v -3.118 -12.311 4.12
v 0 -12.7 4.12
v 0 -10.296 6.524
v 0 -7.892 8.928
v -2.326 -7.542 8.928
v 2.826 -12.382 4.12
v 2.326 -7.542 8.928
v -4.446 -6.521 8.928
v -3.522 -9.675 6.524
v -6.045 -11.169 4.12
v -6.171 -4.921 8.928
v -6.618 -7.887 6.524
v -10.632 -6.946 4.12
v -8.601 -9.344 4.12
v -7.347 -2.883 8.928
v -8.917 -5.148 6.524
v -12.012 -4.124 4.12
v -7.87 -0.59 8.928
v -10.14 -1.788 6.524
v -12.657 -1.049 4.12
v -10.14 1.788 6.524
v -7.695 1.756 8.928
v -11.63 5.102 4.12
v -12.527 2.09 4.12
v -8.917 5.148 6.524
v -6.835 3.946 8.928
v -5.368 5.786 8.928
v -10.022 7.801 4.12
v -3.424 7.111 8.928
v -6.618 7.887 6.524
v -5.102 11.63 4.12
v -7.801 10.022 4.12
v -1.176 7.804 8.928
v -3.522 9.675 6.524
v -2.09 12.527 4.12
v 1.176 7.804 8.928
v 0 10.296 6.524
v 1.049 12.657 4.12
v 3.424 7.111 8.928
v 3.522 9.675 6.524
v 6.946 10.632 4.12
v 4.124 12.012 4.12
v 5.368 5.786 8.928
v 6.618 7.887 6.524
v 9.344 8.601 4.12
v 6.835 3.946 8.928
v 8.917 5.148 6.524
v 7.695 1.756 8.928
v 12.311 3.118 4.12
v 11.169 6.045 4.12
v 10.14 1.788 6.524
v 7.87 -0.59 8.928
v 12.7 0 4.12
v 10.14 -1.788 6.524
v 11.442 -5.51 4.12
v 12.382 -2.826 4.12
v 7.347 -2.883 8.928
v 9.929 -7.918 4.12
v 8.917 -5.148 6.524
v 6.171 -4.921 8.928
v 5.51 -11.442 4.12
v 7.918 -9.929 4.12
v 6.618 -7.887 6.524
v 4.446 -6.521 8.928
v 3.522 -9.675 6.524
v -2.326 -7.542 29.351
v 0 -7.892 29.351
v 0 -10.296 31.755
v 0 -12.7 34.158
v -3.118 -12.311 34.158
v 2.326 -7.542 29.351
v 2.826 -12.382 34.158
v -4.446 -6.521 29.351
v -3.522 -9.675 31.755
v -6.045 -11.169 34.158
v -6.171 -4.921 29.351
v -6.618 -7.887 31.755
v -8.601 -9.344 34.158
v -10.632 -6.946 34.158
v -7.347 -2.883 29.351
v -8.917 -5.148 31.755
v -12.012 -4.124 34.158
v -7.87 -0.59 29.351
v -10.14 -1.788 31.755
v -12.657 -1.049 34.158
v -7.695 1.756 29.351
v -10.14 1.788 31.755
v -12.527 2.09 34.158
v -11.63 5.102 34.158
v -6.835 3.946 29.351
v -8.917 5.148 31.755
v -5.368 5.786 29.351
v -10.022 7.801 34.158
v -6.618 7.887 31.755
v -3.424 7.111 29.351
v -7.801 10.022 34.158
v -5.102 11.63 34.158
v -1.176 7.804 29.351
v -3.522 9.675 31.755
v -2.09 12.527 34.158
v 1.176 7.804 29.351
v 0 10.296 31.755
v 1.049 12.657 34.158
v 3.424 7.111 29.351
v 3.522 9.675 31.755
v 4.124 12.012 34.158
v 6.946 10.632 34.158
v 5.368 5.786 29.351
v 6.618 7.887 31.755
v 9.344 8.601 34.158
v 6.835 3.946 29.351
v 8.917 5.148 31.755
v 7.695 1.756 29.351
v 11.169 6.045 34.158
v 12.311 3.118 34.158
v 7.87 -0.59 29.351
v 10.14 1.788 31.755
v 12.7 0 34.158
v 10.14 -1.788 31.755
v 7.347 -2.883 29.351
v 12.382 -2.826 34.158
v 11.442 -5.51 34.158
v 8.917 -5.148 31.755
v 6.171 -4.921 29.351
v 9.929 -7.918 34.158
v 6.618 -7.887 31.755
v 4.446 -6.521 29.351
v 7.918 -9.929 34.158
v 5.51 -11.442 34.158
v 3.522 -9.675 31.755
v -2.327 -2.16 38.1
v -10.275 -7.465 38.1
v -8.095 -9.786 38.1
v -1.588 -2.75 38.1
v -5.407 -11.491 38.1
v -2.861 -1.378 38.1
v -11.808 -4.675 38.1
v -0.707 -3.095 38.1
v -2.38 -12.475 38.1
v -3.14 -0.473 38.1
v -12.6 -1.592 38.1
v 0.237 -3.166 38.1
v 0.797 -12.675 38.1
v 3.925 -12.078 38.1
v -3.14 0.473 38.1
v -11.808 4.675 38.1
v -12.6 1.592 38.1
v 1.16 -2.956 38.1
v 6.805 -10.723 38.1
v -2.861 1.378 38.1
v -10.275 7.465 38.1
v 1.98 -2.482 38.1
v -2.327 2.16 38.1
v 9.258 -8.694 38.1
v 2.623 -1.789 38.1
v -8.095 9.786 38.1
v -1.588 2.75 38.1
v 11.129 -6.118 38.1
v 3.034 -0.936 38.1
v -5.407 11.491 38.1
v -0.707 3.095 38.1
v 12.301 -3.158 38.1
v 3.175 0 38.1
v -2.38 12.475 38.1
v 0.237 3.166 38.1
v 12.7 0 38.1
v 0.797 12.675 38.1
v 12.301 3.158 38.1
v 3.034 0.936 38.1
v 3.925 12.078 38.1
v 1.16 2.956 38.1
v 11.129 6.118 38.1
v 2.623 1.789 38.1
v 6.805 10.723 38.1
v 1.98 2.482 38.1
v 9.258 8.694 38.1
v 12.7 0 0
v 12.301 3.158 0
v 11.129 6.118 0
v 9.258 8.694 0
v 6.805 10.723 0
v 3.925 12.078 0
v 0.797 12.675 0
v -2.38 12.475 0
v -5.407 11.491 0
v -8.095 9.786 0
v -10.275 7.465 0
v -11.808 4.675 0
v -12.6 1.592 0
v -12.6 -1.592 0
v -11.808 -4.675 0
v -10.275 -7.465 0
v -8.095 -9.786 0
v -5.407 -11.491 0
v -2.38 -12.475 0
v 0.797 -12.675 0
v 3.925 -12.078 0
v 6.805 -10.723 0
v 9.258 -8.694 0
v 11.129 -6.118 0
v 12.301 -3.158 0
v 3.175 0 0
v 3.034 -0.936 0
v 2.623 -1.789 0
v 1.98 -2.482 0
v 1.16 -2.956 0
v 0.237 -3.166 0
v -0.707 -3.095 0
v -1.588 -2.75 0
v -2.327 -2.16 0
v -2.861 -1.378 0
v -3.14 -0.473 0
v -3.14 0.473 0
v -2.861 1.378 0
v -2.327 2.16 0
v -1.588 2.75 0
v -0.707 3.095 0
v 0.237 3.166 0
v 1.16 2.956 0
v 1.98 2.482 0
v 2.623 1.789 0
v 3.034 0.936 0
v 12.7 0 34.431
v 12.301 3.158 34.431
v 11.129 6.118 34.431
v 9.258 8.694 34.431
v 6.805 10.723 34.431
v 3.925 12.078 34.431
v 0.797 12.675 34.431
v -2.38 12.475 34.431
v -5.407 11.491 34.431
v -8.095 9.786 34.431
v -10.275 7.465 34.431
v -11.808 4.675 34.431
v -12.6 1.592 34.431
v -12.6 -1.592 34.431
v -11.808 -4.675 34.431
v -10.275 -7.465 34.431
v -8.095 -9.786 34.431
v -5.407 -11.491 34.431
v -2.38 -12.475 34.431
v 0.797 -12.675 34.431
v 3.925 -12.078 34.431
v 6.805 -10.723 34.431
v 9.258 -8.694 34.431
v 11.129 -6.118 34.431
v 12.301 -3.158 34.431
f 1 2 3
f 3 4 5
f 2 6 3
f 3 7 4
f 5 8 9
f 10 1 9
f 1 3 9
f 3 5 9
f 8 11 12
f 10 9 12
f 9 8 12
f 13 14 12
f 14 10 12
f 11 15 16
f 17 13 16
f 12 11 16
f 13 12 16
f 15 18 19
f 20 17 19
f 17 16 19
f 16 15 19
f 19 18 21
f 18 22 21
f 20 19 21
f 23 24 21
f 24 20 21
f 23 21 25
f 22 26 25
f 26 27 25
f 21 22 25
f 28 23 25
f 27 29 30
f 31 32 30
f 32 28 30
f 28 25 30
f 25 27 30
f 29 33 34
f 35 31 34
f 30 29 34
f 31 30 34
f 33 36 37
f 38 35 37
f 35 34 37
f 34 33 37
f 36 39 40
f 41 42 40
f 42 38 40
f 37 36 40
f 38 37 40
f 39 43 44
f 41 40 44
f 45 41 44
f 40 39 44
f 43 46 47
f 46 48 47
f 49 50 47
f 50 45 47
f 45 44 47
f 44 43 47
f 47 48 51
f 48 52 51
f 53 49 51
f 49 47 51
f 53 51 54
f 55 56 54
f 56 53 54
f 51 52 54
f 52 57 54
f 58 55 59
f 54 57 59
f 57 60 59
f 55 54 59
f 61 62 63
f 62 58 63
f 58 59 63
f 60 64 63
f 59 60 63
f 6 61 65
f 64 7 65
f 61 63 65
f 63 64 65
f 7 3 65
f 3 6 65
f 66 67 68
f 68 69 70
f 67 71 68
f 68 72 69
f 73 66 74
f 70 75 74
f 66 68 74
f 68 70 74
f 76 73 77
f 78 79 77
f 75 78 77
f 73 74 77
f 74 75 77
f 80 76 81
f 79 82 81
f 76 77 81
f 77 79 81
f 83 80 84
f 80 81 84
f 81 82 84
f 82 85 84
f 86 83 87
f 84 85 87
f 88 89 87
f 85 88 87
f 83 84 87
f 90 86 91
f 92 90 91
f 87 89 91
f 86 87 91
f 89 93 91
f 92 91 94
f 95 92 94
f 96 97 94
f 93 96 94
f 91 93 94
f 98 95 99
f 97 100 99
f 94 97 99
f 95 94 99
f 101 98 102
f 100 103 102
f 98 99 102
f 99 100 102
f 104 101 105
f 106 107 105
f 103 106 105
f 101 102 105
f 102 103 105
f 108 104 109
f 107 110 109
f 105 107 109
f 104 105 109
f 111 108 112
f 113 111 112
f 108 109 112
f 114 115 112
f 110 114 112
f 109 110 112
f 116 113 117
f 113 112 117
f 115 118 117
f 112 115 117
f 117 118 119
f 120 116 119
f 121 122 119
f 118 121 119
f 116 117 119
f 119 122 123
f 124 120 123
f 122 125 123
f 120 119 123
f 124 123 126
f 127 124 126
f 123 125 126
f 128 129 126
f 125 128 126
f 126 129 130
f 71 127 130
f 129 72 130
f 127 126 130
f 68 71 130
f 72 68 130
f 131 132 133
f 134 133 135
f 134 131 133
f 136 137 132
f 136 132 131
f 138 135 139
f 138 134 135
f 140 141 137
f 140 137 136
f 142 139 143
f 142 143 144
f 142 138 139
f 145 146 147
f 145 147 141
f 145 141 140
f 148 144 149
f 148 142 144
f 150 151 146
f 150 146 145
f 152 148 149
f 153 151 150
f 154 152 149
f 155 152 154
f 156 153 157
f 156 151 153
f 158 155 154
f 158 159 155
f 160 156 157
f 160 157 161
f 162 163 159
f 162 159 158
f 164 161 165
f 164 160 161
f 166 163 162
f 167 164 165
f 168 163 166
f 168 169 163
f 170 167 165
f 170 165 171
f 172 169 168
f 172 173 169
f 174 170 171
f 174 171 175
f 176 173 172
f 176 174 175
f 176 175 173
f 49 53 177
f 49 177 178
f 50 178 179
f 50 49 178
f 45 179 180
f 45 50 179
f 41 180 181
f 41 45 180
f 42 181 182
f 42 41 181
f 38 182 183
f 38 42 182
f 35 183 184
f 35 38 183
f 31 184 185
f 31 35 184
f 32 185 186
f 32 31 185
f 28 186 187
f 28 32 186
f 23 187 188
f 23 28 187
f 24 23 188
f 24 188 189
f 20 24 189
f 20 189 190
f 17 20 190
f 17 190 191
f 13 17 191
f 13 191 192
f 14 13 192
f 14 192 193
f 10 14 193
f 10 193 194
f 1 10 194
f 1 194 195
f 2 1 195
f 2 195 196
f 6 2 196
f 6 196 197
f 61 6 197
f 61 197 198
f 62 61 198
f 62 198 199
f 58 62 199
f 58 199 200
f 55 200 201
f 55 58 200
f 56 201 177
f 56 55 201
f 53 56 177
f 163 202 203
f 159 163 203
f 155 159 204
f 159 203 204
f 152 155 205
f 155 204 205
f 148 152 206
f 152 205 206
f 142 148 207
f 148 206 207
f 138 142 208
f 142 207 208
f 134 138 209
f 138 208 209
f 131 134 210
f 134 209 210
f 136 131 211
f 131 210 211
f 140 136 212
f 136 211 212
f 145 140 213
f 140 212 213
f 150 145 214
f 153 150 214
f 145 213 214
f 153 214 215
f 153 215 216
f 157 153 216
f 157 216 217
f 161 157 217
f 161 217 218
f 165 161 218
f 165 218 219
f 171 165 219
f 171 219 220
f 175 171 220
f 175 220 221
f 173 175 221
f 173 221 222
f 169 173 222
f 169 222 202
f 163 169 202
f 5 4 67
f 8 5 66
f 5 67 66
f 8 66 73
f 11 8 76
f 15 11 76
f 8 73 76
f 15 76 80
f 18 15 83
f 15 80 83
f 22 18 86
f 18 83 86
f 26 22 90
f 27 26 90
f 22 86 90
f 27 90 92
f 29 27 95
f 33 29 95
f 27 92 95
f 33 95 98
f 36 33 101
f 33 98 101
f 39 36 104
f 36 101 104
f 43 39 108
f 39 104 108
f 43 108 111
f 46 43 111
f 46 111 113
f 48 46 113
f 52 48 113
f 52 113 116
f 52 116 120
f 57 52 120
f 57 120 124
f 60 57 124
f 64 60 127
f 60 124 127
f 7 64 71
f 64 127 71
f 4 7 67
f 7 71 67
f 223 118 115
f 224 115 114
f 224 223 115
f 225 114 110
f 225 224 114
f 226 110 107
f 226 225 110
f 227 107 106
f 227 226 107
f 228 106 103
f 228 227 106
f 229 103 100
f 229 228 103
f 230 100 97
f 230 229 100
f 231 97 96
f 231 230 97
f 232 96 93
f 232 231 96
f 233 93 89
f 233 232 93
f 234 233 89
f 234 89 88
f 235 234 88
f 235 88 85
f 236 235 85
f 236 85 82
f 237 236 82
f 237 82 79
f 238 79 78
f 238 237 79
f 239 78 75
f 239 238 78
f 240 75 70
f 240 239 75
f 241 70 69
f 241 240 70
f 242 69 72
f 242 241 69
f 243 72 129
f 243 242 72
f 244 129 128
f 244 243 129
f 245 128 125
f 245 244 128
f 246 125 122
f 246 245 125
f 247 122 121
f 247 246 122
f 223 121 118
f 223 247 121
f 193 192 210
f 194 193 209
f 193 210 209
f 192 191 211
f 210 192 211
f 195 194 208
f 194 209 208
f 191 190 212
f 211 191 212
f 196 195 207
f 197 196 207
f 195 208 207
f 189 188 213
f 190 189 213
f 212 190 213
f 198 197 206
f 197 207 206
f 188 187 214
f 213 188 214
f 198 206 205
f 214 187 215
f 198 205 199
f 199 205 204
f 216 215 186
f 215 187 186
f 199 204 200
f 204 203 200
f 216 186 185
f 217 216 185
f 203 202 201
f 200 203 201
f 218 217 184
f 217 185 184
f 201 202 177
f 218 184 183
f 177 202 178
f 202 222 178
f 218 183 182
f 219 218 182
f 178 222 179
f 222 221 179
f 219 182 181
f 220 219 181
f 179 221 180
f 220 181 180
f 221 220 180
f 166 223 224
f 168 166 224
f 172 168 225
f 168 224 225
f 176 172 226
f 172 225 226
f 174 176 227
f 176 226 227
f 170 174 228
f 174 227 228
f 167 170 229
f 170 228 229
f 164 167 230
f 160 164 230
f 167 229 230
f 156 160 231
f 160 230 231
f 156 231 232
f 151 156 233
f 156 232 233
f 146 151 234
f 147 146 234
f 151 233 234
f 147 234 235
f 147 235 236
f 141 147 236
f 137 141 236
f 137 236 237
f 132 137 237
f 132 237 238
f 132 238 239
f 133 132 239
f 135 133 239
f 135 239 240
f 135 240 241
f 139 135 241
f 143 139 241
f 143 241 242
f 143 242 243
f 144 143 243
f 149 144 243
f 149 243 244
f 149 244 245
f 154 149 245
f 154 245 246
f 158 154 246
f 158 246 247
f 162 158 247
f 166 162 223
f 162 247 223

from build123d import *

# Parameters (mm, degrees)
F0_R         = 12.7
F1_DEPTH     = 38.1
F2_W         = 10.2602215484
F2_H         = 30.5833565071
F4_R         = 3.175
F5_DEPTH     = 50.8
F6_S5_R      = 12.7
F6_T6_DEPTH  = 20
F6_S11_R     = 12.7
F6_T12_DEPTH = 20


# Not quite as in the source:
# - a fillet or chamfer that OpenCascade refuses, or shapes differently, is made with other operations: its cross-section is extruded or revolved along the edge and cut away or added


with BuildPart() as f1:
    # F0 (on Top) → F1 (new body)
    with BuildSketch(Plane.XY):
        Circle(F0_R)
    extrude(amount=F1_DEPTH)

    # F2 (on Right) → F3 (revolve, cut)
    with BuildSketch(Plane.YZ):
        with Locations((-13.0225899629, 19.1392614506)):
            Rectangle(F2_W, F2_H)
    revolve(axis=Axis((0, 0, 18.941948656), (0, 0, -1)), mode=Mode.SUBTRACT)

    # F4 (on face) → F5 (cut)
    with BuildSketch(Plane(origin=(0, 0, 0), x_dir=(1, 0, 0), z_dir=(0, 0, -1))):
        Circle(F4_R)
    extrude(amount=-F5_DEPTH, mode=Mode.SUBTRACT)

    # F6: chamfer of 5.08 on 2 edges, made by hand


with BuildPart() as f6_tool2:
    # F6_s3 → F6_t4 (revolve)
    with BuildSketch(Plane.YZ):
        Polygon((-12.9724791887, 3.8475831971), (-7.8924791887, 8.9275831971), (-7.8924791887, 3.8475831971), align=None)
    revolve(axis=Axis((0, 0, 3.8475831971), (0, 0, -1)))

    # F6_s5 → F6_t6 (intersect, symmetric)
    with BuildSketch(Plane.XY.offset(6.4)):
        Circle(F6_S5_R)
    extrude(amount=F6_T6_DEPTH, both=True, mode=Mode.INTERSECT)


with BuildPart() as f1_1:
    add(f1.part)

    # F6_t1: union F6_tool2
    add(f6_tool2.part)


with BuildPart() as f6_tool8:
    # F6_s9 → F6_t10 (revolve)
    with BuildSketch(Plane.YZ):
        Polygon((-7.8924791887, 29.3509397042), (-12.9724791887, 34.4309397042), (-7.8924791887, 34.4309397042), align=None)
    revolve(axis=Axis((0, 0, 34.4309397042), (0, 0, -1)))

    # F6_s11 → F6_t12 (intersect, symmetric)
    with BuildSketch(Plane.XY.offset(31.9)):
        Circle(F6_S11_R)
    extrude(amount=F6_T12_DEPTH, both=True, mode=Mode.INTERSECT)


with BuildPart() as f1_2:
    add(f1_1.part)

    # F6_t7: union F6_tool8
    add(f6_tool8.part)


solid = f1_2.part
